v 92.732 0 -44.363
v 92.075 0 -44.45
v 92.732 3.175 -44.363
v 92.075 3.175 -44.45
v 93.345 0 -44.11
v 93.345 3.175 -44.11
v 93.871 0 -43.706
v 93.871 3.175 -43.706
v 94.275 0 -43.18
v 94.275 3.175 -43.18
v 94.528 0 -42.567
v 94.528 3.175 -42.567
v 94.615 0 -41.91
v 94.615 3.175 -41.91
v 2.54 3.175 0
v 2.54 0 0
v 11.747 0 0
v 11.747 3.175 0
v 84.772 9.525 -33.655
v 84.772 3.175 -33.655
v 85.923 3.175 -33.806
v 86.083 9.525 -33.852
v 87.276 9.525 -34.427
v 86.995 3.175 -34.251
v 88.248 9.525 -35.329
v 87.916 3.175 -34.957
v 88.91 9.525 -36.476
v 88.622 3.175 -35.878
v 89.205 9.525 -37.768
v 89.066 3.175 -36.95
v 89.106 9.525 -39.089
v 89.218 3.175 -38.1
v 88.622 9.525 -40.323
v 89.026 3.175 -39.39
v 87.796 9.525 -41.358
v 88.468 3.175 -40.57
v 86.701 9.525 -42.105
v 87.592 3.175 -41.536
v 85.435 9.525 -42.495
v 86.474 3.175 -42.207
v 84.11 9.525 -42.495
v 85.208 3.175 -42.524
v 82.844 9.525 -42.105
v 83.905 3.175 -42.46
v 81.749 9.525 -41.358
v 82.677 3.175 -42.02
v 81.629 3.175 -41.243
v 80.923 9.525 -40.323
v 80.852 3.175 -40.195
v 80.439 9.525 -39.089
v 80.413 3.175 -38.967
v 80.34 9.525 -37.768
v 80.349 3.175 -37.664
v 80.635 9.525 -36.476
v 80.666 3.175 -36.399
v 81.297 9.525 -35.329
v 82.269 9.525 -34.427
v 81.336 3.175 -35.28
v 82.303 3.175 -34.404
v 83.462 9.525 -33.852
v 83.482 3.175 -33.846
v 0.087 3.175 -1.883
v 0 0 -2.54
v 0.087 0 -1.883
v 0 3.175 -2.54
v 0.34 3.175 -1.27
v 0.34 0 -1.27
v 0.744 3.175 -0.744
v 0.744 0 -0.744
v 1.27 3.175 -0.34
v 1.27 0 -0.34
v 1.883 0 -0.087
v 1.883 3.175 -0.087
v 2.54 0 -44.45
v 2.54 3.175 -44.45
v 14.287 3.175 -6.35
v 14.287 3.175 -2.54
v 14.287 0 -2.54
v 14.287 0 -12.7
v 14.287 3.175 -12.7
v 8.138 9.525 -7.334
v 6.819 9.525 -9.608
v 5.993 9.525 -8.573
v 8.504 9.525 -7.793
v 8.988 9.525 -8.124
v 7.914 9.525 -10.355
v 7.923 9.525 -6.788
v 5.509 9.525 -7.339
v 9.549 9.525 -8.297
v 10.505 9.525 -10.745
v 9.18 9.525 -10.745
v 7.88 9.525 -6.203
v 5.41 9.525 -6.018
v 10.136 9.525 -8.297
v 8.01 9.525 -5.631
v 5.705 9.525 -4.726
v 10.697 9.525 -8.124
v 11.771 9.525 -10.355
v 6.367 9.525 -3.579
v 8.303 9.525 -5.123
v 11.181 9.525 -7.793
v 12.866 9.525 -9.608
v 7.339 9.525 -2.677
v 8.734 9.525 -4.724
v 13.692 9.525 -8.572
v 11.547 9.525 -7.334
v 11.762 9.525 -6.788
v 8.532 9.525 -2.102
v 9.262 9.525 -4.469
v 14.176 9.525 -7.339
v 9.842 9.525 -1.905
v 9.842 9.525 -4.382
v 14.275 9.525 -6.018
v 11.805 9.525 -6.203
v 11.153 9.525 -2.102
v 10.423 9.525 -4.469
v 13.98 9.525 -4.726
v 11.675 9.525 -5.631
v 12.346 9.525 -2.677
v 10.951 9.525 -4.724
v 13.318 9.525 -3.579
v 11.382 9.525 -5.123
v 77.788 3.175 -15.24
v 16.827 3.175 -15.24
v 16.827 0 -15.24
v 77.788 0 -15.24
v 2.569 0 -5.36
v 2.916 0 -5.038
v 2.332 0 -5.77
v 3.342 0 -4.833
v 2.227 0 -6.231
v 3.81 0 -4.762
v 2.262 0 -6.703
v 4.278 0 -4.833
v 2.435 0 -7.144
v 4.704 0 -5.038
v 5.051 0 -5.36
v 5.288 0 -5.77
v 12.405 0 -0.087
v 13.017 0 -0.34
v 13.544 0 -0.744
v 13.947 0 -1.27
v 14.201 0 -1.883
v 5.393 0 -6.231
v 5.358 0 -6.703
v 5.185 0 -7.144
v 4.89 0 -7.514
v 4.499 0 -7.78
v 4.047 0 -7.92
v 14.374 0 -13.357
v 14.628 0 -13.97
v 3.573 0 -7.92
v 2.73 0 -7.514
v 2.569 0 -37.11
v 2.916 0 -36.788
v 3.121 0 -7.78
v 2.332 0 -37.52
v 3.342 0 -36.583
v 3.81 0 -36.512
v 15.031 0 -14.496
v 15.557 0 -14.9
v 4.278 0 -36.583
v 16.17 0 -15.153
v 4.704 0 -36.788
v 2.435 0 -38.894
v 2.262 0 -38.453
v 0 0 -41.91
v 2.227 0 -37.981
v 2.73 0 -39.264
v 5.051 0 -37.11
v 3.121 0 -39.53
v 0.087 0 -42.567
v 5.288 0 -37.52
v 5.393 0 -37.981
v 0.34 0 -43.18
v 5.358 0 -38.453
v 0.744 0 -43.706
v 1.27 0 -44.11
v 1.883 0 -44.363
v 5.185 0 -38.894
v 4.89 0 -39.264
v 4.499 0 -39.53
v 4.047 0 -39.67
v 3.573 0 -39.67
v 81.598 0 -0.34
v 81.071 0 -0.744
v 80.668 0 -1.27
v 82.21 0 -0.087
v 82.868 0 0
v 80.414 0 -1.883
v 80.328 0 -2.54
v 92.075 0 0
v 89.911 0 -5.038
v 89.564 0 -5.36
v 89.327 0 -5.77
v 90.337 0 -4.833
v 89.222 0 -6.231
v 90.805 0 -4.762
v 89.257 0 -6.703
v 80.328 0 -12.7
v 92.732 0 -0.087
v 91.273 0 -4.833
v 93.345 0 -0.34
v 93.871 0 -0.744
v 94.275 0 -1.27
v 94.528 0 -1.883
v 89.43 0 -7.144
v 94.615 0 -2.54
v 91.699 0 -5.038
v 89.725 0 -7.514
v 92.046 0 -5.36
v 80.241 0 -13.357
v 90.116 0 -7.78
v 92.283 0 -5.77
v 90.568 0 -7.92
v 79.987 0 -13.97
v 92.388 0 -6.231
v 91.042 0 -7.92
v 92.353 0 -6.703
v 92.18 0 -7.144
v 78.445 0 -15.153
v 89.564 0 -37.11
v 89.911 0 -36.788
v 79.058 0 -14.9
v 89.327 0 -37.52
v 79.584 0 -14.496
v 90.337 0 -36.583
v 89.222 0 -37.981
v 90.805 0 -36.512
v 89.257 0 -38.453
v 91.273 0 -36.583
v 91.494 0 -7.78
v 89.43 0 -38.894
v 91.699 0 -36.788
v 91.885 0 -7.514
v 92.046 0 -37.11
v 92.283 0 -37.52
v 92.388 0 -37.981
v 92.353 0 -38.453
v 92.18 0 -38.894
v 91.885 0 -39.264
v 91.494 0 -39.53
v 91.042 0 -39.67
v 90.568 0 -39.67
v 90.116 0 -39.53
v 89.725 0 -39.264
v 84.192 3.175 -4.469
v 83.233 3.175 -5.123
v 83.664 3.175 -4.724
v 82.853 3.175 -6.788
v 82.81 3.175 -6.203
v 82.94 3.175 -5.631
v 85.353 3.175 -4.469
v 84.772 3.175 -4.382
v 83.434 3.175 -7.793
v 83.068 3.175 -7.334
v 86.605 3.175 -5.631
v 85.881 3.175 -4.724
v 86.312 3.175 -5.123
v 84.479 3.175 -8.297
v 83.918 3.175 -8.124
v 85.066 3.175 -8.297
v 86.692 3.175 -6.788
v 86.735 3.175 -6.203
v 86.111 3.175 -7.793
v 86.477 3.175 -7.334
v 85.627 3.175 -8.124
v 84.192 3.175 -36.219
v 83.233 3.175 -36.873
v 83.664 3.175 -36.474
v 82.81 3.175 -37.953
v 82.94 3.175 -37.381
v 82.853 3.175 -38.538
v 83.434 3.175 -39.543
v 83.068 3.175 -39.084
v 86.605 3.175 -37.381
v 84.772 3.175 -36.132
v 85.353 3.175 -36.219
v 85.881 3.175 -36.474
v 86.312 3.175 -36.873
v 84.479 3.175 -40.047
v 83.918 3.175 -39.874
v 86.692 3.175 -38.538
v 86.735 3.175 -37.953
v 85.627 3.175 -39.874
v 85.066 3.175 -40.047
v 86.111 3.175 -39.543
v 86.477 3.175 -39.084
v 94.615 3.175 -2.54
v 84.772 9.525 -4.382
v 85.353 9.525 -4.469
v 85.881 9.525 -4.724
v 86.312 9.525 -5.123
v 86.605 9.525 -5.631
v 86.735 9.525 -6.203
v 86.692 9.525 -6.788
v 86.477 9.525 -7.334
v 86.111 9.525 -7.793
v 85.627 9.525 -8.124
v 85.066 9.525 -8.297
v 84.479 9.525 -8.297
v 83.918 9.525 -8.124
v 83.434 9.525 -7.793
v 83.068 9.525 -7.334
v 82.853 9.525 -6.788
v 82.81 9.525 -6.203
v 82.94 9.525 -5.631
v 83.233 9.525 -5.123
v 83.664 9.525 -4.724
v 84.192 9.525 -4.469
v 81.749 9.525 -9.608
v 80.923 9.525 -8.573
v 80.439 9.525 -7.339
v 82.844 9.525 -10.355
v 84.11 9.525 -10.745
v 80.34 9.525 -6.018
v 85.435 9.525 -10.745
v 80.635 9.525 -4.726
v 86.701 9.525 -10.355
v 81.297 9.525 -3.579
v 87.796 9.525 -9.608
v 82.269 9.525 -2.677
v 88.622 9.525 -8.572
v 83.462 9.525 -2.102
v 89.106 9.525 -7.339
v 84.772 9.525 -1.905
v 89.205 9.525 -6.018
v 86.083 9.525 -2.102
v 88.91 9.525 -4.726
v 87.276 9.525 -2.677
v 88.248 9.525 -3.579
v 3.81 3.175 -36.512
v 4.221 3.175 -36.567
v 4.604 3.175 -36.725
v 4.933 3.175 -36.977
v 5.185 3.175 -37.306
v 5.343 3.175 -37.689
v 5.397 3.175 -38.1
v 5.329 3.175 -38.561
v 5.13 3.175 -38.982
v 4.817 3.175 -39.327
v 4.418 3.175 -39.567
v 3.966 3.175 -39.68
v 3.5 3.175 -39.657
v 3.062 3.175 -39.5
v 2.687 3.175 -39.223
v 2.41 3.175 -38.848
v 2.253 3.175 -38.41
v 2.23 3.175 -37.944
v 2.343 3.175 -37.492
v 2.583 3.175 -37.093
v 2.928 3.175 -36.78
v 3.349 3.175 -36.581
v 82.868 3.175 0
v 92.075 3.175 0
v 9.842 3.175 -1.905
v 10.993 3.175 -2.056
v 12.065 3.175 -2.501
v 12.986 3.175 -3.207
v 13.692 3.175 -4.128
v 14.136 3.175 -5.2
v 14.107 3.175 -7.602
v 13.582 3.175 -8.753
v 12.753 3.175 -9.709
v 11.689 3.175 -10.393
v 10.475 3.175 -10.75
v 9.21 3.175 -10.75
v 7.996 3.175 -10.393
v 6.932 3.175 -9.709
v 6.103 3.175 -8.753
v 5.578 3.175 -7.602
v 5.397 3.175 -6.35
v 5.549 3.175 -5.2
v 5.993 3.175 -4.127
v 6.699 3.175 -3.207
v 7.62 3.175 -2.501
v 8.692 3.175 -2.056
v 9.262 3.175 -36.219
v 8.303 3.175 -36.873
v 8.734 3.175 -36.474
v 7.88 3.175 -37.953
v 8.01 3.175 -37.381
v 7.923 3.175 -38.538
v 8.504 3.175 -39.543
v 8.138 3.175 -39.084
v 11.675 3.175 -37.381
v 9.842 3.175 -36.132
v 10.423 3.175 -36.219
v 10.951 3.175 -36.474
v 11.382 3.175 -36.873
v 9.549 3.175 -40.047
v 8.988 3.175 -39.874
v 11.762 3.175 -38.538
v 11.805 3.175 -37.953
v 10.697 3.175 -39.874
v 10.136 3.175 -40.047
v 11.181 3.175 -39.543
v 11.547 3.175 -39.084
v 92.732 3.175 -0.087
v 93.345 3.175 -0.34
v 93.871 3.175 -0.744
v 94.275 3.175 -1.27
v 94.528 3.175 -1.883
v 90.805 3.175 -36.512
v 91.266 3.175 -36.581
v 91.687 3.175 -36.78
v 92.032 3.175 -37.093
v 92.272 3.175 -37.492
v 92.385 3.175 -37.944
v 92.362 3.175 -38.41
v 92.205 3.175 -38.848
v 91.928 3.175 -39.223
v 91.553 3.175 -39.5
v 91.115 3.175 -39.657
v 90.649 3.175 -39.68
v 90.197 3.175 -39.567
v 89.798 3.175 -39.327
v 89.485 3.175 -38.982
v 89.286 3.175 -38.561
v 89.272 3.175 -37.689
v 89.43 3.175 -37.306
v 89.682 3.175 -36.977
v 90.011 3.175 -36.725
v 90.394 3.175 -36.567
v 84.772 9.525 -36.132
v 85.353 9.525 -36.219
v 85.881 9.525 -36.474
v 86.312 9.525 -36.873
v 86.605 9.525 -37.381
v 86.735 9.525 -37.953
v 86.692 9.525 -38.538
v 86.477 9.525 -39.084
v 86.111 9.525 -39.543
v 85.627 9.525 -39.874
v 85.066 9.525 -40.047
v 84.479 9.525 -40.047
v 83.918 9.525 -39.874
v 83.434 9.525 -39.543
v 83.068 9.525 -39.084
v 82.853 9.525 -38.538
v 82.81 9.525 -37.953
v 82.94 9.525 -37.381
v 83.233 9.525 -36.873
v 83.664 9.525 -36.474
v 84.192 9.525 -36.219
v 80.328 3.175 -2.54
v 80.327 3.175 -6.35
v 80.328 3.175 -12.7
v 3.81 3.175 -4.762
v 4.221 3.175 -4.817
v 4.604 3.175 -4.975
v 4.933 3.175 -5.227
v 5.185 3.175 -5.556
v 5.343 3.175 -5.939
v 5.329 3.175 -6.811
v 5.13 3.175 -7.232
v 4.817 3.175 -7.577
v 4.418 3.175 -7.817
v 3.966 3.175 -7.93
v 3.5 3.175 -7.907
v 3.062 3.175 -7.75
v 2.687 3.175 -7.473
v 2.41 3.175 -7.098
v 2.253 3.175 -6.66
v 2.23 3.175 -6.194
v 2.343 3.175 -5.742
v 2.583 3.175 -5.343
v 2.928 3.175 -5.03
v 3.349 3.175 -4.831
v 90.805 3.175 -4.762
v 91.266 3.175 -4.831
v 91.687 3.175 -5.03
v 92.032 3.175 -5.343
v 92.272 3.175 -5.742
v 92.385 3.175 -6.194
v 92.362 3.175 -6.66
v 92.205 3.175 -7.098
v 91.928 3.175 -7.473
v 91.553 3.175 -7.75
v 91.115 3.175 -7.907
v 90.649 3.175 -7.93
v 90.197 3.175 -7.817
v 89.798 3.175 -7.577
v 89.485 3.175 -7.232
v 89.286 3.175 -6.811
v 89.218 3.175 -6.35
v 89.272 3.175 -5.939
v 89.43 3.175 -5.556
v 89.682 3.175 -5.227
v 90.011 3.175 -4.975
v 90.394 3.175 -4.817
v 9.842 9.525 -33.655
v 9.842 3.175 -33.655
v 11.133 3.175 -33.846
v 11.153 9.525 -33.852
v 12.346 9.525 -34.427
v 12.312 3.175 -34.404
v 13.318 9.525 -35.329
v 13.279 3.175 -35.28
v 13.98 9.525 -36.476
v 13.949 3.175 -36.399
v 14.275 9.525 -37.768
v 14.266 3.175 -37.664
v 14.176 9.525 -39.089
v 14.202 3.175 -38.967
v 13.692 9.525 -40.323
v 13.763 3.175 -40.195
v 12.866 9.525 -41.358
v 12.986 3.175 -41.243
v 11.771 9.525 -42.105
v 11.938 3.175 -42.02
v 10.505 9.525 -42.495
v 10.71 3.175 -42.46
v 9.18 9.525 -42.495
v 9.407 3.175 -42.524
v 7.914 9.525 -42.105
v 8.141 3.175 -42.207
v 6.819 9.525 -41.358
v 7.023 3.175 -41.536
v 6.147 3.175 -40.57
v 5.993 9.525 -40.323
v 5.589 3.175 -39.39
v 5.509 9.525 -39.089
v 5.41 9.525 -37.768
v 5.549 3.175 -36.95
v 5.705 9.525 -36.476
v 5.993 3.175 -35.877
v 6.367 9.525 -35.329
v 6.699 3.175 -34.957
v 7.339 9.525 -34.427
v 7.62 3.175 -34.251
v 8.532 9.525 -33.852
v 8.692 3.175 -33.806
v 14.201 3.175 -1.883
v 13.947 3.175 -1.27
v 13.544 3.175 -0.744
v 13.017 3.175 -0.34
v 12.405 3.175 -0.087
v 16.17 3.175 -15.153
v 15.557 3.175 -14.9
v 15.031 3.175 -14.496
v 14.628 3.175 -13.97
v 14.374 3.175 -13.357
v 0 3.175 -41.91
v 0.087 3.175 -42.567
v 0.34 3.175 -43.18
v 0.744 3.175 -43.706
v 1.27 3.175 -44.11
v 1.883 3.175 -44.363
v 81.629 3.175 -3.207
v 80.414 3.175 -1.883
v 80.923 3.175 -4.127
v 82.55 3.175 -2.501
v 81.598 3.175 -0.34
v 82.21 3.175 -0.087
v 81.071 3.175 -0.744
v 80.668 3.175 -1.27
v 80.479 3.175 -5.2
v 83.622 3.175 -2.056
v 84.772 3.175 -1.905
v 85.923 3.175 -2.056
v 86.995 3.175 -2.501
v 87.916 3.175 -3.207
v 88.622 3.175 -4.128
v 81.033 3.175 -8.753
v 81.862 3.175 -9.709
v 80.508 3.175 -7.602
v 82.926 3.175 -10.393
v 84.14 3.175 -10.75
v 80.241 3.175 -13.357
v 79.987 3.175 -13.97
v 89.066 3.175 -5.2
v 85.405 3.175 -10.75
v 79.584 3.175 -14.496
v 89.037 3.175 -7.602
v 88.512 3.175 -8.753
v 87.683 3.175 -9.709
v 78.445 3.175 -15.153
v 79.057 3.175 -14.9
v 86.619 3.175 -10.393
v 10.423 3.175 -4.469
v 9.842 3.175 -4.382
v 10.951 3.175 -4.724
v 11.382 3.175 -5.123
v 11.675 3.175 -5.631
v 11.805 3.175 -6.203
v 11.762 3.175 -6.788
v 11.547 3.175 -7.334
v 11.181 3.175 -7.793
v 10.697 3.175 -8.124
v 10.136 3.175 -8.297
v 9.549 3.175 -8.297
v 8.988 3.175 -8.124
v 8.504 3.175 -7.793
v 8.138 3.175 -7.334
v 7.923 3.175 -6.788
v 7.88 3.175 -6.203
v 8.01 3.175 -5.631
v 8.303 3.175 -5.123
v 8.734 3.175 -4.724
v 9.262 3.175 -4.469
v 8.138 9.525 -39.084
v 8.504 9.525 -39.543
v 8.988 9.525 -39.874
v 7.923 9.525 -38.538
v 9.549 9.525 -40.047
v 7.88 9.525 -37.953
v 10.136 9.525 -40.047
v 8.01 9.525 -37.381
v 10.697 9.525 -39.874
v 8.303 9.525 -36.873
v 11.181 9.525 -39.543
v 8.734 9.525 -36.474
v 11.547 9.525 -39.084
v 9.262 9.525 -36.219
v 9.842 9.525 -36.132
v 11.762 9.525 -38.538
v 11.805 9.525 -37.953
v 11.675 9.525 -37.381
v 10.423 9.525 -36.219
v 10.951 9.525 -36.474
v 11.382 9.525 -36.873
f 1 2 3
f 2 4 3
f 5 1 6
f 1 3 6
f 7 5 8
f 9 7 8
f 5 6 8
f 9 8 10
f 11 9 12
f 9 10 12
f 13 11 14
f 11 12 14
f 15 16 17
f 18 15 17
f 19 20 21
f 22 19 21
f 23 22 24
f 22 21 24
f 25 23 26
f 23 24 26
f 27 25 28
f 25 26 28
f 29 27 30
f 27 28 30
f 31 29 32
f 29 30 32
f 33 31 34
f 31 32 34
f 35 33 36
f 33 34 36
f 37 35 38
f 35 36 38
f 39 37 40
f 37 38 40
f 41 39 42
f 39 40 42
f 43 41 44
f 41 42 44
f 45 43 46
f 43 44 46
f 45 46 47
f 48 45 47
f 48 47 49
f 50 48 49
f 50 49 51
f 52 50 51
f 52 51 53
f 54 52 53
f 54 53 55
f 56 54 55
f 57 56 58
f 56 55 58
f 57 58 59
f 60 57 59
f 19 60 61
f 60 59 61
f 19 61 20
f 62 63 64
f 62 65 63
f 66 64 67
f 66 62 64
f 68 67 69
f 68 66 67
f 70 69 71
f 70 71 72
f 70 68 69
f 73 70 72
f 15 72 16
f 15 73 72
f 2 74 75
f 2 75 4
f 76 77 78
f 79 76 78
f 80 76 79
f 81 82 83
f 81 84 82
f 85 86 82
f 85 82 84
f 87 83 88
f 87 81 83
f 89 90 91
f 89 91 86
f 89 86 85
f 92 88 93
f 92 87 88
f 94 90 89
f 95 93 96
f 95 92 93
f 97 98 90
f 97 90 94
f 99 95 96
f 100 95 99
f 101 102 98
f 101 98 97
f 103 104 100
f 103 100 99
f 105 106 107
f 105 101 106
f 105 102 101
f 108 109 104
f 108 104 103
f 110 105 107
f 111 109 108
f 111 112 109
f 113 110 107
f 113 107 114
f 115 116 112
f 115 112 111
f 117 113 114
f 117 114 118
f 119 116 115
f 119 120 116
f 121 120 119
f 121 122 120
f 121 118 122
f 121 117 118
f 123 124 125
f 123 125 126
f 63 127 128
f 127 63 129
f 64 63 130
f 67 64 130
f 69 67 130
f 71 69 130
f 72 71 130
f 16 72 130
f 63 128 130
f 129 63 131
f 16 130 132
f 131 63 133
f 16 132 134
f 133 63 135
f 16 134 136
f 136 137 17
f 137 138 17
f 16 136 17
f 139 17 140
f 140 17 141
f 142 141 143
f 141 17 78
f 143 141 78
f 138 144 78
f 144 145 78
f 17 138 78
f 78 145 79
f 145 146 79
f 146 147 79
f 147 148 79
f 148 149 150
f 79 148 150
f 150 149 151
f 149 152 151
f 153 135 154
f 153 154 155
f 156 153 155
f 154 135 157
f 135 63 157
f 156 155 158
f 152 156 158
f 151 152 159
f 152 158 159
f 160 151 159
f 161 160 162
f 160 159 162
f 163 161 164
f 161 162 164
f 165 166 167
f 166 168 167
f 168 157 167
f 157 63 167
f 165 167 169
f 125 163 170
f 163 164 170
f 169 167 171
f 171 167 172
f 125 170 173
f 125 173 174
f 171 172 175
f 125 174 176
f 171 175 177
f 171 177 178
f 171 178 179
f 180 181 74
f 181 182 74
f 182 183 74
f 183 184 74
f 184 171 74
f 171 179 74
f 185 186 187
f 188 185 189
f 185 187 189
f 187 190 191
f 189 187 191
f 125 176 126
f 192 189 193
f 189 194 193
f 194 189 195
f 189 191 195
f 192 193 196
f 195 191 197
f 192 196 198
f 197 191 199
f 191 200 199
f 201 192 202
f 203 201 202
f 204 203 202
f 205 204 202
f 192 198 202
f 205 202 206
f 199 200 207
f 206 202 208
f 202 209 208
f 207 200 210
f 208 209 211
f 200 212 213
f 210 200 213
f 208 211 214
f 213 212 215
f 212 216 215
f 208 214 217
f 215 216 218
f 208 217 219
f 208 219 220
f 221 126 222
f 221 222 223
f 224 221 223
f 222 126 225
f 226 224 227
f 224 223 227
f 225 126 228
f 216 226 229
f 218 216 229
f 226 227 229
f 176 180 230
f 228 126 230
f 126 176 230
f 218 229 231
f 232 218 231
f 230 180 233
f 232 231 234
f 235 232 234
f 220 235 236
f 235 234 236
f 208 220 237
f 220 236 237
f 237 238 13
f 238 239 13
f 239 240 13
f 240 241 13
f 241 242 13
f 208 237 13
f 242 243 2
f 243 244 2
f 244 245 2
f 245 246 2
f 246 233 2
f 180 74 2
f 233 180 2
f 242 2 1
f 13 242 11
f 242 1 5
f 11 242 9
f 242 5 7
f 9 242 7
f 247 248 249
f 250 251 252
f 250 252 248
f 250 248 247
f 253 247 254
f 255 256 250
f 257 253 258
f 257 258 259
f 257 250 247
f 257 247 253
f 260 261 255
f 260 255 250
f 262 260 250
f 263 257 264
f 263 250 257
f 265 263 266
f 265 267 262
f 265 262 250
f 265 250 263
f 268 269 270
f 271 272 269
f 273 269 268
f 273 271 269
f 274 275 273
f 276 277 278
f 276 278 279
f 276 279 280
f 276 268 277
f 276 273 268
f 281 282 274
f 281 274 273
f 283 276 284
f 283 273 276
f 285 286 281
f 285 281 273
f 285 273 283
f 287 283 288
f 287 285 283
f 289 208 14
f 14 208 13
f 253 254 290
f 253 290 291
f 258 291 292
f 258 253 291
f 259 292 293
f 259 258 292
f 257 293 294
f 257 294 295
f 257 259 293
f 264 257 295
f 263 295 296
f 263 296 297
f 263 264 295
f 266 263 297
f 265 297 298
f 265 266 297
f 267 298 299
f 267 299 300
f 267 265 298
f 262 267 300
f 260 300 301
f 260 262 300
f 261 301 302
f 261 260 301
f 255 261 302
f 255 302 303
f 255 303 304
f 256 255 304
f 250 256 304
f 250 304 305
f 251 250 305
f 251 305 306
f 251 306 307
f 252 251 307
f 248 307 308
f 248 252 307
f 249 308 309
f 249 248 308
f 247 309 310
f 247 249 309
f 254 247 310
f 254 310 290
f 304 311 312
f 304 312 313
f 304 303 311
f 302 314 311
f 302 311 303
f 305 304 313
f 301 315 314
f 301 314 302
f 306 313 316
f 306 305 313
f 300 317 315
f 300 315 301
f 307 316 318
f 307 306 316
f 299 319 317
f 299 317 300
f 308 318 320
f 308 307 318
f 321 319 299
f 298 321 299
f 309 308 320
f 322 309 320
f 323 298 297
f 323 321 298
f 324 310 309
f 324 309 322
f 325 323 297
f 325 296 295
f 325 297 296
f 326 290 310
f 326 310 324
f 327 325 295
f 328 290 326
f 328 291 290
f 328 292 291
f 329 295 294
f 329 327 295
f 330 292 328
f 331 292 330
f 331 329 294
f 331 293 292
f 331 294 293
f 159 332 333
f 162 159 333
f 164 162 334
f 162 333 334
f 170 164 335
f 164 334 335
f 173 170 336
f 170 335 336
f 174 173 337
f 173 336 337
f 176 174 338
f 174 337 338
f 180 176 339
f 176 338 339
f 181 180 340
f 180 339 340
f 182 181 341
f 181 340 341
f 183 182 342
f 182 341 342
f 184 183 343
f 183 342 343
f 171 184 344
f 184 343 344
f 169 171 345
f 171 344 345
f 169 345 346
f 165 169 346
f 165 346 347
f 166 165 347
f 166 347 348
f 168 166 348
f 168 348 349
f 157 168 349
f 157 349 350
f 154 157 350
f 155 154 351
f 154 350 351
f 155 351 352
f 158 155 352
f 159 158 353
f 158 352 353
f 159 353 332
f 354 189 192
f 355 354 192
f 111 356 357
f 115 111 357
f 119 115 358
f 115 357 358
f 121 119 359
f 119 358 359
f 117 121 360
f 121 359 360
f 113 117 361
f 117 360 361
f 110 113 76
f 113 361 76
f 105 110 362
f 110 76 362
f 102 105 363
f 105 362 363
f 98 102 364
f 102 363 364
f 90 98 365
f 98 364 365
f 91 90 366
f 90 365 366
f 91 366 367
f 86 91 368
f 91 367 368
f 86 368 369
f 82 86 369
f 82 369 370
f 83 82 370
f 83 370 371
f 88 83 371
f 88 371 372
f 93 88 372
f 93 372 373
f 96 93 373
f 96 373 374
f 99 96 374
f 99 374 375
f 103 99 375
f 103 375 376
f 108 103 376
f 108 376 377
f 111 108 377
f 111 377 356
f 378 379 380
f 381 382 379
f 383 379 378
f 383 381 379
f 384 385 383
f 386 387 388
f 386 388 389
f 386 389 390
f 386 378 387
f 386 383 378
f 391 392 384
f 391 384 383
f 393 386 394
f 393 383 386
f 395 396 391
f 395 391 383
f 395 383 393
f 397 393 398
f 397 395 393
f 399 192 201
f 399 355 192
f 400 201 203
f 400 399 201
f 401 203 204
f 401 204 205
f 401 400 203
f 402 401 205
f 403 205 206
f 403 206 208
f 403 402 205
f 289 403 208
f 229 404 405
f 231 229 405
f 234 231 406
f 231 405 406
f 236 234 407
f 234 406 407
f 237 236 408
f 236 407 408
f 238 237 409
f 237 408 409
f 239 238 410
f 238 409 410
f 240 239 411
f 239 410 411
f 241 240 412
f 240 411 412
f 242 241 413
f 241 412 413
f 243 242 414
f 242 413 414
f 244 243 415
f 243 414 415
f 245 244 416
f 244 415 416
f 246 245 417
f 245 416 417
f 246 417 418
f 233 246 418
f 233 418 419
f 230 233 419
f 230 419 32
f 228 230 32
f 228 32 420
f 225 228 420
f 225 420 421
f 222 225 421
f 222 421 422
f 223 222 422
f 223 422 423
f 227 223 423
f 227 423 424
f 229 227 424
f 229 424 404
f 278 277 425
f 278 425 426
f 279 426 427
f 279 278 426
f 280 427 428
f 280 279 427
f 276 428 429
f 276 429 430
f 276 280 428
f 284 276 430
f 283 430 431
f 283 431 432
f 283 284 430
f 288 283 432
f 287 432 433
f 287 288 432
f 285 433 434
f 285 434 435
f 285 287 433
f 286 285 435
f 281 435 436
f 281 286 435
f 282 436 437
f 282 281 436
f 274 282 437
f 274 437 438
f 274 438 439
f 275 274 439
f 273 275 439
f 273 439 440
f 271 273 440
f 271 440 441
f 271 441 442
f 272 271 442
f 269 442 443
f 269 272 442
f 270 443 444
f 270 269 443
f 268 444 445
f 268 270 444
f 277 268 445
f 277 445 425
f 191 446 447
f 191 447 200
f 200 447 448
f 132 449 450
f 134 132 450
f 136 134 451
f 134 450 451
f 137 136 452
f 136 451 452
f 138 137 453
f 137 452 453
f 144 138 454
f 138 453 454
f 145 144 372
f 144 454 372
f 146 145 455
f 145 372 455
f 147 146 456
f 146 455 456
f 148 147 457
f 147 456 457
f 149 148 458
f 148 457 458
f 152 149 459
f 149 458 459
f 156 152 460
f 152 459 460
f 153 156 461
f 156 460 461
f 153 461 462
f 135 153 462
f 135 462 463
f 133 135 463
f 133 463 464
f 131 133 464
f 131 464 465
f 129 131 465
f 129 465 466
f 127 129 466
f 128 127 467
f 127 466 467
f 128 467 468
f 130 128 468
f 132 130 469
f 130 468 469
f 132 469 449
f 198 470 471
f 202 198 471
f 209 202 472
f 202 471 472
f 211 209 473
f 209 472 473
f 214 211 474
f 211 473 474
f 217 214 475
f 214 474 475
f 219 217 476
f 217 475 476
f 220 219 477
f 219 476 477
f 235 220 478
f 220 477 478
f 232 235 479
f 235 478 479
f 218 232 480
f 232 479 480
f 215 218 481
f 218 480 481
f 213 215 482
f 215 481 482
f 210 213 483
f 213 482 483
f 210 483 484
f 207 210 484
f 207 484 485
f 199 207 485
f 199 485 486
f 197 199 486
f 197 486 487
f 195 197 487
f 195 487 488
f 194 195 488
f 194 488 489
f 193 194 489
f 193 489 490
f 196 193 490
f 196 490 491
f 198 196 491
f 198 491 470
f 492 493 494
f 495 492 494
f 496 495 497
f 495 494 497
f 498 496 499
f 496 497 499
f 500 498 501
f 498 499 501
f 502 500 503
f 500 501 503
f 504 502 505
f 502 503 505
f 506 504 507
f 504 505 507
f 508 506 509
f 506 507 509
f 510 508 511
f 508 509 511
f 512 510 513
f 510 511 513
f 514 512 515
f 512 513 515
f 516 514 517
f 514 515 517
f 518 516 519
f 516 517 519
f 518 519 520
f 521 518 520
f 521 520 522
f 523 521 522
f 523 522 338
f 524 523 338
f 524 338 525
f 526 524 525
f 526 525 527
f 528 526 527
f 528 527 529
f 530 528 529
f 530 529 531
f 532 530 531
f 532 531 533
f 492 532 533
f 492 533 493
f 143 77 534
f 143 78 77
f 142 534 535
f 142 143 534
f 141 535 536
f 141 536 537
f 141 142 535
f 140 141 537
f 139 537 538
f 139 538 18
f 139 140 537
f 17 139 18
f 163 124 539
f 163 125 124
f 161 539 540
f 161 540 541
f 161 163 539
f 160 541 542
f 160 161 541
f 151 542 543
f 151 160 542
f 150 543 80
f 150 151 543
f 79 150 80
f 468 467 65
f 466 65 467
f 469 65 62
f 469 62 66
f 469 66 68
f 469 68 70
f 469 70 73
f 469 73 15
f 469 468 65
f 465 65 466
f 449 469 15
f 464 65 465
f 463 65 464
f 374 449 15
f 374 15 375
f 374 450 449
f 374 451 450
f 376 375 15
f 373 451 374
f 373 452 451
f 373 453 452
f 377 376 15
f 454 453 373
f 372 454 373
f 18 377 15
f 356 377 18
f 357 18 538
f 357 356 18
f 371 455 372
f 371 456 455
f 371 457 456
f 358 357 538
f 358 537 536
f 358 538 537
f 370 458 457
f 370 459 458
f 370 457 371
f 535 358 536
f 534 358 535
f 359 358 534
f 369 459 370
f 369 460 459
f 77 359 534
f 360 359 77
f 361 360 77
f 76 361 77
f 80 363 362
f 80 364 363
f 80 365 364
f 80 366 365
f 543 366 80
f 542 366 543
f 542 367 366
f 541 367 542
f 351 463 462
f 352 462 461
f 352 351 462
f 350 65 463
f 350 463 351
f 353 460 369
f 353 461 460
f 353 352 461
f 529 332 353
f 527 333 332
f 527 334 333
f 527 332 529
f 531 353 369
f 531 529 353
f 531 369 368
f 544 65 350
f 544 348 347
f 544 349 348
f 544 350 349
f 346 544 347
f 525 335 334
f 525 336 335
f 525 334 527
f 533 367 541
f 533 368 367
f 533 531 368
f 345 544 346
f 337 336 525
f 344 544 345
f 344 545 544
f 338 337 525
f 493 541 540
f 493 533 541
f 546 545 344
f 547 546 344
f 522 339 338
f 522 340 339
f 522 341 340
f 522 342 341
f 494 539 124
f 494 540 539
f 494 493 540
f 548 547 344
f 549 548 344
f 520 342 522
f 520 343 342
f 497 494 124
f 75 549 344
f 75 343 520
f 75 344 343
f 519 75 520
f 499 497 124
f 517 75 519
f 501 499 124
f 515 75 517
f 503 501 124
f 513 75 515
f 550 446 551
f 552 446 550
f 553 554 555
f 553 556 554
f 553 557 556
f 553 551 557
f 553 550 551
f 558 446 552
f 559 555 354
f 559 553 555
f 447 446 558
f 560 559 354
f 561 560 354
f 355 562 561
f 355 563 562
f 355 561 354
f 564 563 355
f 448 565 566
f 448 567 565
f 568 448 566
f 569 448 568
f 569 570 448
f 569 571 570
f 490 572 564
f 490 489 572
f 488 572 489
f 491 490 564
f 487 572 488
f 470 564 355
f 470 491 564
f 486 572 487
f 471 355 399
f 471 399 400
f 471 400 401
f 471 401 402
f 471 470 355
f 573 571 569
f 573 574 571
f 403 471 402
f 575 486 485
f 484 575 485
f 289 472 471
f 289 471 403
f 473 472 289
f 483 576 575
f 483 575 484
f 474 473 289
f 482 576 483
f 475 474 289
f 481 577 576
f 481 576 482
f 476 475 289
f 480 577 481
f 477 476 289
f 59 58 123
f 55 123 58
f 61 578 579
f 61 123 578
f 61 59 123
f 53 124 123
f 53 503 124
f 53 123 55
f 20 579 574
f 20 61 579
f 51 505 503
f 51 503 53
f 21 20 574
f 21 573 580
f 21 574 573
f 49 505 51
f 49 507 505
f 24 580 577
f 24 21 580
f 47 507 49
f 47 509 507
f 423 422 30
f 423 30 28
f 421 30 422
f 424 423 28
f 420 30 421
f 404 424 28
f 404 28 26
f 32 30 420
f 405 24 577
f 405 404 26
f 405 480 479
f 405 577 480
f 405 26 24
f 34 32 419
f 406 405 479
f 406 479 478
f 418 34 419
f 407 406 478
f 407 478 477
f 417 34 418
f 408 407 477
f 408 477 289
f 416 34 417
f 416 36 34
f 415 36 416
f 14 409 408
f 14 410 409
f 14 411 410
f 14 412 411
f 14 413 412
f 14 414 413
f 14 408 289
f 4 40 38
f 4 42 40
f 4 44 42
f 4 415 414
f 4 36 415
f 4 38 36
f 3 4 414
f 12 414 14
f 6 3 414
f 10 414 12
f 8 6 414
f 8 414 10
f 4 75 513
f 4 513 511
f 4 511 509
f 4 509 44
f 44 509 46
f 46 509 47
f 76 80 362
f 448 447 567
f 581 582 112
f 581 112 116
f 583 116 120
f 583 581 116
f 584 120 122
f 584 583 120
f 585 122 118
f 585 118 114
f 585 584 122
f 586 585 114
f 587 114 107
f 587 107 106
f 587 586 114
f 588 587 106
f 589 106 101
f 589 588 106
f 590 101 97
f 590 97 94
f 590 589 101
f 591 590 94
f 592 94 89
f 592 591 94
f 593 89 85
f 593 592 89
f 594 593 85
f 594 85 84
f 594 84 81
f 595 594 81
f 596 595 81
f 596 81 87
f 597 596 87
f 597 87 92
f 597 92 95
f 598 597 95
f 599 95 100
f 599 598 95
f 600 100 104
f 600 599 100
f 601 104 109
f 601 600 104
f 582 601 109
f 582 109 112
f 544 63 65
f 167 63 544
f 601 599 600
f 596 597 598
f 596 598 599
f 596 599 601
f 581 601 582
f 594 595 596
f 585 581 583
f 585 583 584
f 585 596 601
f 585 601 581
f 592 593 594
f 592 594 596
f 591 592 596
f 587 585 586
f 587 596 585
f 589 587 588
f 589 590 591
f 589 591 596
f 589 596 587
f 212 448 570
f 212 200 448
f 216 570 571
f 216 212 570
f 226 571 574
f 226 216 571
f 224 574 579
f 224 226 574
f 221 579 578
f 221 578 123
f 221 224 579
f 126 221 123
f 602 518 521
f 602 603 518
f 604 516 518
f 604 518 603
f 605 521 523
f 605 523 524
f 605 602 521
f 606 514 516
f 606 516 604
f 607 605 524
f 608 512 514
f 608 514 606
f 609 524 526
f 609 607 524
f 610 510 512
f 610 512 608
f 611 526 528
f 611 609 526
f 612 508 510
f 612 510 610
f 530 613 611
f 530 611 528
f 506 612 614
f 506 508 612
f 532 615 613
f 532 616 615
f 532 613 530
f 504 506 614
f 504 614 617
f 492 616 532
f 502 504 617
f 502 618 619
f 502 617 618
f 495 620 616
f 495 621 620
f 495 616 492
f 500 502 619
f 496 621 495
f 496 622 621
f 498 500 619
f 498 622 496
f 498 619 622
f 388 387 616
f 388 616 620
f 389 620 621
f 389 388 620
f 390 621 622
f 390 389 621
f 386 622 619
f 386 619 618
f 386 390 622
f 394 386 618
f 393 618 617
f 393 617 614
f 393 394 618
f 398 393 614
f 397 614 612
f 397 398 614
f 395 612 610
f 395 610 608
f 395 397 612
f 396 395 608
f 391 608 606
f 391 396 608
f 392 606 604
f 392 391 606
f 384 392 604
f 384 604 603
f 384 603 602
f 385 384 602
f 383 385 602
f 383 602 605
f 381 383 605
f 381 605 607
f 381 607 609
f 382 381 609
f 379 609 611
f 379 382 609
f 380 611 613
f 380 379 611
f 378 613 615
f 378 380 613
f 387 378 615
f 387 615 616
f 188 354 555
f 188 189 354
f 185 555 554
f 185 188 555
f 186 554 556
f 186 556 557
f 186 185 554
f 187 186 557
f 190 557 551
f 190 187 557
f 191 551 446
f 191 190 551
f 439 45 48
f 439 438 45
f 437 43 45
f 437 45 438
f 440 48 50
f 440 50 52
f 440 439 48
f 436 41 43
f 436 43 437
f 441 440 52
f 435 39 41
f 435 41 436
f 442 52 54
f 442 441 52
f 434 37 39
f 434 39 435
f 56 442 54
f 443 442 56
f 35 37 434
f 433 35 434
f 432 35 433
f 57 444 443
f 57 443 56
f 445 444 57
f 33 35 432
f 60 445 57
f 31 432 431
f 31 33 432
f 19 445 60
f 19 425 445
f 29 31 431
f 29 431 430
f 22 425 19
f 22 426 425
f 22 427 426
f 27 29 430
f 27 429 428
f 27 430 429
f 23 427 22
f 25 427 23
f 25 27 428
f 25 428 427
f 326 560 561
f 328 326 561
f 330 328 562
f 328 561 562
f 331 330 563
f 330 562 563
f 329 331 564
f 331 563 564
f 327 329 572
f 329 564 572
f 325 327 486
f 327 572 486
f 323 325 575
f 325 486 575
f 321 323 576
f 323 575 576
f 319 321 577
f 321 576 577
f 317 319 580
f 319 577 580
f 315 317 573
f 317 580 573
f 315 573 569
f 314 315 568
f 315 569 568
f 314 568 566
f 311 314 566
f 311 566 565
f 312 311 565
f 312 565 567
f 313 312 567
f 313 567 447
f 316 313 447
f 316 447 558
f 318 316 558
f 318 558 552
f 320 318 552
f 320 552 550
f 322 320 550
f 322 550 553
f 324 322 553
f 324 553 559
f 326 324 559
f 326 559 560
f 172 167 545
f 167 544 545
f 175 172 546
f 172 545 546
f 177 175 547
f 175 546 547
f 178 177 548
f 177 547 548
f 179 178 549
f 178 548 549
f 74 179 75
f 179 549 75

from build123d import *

# Parameters (mm, degrees)
SKETCH1_W           = 94.615
SKETCH1_H           = 44.45
BOSS_EXTRUDE1_DEPTH = 3.175
SKETCH2_R           = 4.445
SKETCH2_R_2         = 1.9685
BOSS_EXTRUDE2_DEPTH = 6.35
SKETCH4_R           = 1.5875
CUT_EXTRUDE1_DEPTH  = 6.35
FILLET1_R           = 2.54
SKETCH6_W           = 66.04
SKETCH6_H           = 15.24
CUT_EXTRUDE2_DEPTH  = 5.08
FILLET2_R           = 2.54


with BuildPart() as part:
    # Sketch1 → Boss-Extrude1 (new body)
    with BuildSketch(Plane(origin=(0, 0, 0), x_dir=(1, 0, 0), z_dir=(0, 1, 0))):
        with Locations((47.3075, 22.225)):
            Rectangle(SKETCH1_W, SKETCH1_H)
    extrude(amount=BOSS_EXTRUDE1_DEPTH)

    # Sketch2 → Boss-Extrude2 (add)
    # profile 1 of 4: a face of its own
    with BuildSketch(Plane(origin=(0, 3.175, 0), x_dir=(1, 0, 0), z_dir=(0, 1, 0))):
        with Locations(Location((9.8425, 6.35, 0), (0, 0, 270))):
            Circle(SKETCH2_R)
        with Locations(Location((9.8425, 6.35, 0), (0, 0, 270))):
            Circle(SKETCH2_R_2, mode=Mode.SUBTRACT)
    # profile 2 of 4: a face of its own
    with BuildSketch(Plane(origin=(0, 3.175, 0), x_dir=(1, 0, 0), z_dir=(0, 1, 0))):
        with Locations(Location((9.8425, 38.1, 0), (0, 0, 270))):
            Circle(SKETCH2_R)
        with Locations(Location((9.8425, 38.1, 0), (0, 0, 270))):
            Circle(SKETCH2_R_2, mode=Mode.SUBTRACT)
    # profile 3 of 4: a face of its own
    with BuildSketch(Plane(origin=(0, 3.175, 0), x_dir=(1, 0, 0), z_dir=(0, 1, 0))):
        with Locations(Location((84.7725, 38.1, 0), (0, 0, 270))):
            Circle(SKETCH2_R)
        with Locations(Location((84.7725, 38.1, 0), (0, 0, 270))):
            Circle(SKETCH2_R_2, mode=Mode.SUBTRACT)
    # profile 4 of 4: a face of its own
    with BuildSketch(Plane(origin=(0, 3.175, 0), x_dir=(1, 0, 0), z_dir=(0, 1, 0))):
        with Locations(Location((84.7725, 6.35, 0), (0, 0, 270))):
            Circle(SKETCH2_R)
        with Locations(Location((84.7725, 6.35, 0), (0, 0, 270))):
            Circle(SKETCH2_R_2, mode=Mode.SUBTRACT)
    extrude(amount=BOSS_EXTRUDE2_DEPTH)

    # Sketch4 → Cut-Extrude1 (cut)
    with BuildSketch(Plane(origin=(0, 3.175, 0), x_dir=(1, 0, 0), z_dir=(0, 1, 0))):
        with Locations(Location((3.81, 38.1, 0), (0, 0, 270))):
            Circle(SKETCH4_R)
        with Locations(Location((3.81, 6.35, 0), (0, 0, 270))):
            Circle(SKETCH4_R)
        with Locations(Location((90.805, 38.1, 0), (0, 0, 270))):
            Circle(SKETCH4_R)
        with Locations(Location((90.805, 6.35, 0), (0, 0, 270))):
            Circle(SKETCH4_R)
    extrude(amount=-CUT_EXTRUDE1_DEPTH, mode=Mode.SUBTRACT)

    # Fillet1
    fillet1_edges = [part.edges().sort_by_distance(p)[0] for p in [
        (0, 1.5875, -44.45),
        (0, 1.5875, 0),
        (94.615, 1.5875, 0),
        (94.615, 1.5875, -44.45),
    ]]
    fillet(fillet1_edges, radius=FILLET1_R)

    # Sketch6 → Cut-Extrude2 (cut)
    with BuildSketch(Plane(origin=(0, 3.175, 0), x_dir=(1, 0, 0), z_dir=(0, 1, 0))):
        with Locations((47.3075, 7.62)):
            Rectangle(SKETCH6_W, SKETCH6_H)
    extrude(amount=-CUT_EXTRUDE2_DEPTH, mode=Mode.SUBTRACT)

    # Fillet2
    fillet2_edges = [part.edges().sort_by_distance(p)[0] for p in [
        (14.2875, 1.5875, 0),
        (14.2875, 1.5875, -15.24),
        (80.3275, 1.5875, -15.24),
        (80.3275, 1.5875, 0),
    ]]
    fillet(fillet2_edges, radius=FILLET2_R)


solid = part.part
